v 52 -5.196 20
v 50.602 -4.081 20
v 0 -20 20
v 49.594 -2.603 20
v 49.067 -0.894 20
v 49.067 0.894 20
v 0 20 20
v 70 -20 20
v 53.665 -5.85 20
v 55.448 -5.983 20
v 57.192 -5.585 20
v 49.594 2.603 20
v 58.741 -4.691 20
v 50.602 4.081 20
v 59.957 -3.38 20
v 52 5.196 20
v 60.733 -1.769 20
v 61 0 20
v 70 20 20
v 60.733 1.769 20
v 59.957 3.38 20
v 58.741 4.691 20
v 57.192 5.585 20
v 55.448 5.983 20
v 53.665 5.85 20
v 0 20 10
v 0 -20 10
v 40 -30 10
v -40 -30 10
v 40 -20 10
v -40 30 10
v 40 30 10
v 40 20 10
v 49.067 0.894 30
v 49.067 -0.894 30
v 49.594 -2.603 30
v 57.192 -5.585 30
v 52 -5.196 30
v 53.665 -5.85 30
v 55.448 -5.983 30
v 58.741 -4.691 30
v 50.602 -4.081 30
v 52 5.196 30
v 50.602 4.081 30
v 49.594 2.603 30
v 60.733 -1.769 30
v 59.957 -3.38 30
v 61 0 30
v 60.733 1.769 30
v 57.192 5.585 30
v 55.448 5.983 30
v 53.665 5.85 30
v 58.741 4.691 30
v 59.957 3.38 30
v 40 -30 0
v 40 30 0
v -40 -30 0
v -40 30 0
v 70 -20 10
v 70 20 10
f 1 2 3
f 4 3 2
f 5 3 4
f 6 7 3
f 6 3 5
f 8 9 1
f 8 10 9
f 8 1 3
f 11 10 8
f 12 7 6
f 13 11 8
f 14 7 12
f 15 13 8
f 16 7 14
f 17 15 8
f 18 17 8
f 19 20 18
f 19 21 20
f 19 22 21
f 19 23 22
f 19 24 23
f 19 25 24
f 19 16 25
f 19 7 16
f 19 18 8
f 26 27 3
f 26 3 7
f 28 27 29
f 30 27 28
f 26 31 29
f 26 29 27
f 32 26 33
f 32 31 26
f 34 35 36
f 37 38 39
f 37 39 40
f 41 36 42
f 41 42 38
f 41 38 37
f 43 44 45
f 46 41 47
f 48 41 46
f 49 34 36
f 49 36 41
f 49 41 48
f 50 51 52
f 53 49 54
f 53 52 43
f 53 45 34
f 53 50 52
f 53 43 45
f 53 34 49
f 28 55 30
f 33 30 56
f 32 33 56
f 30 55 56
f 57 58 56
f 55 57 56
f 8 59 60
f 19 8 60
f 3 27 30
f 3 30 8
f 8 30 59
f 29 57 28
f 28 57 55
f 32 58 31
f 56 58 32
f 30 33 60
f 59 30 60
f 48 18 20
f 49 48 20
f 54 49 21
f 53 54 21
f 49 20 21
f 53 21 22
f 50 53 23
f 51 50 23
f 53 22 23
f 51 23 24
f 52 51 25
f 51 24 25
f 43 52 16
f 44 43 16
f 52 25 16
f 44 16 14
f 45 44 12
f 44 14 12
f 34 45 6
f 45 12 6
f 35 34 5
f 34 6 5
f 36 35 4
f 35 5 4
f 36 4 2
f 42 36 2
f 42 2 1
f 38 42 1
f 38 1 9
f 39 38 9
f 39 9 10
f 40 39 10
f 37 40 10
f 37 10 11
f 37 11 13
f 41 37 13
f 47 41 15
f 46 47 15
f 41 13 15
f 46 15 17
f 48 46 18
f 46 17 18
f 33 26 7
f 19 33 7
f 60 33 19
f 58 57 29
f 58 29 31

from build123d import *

# Parameters (mm, degrees)
CROQUIS1_W              = 80
CROQUIS1_H              = 60
SALIENTE_EXTRUIR1_DEPTH = 10
CROQUIS2_W              = 70
CROQUIS2_H              = 40
SALIENTE_EXTRUIR2_DEPTH = 10
CROQUIS3_R              = 6
SALIENTE_EXTRUIR3_DEPTH = 10


with BuildPart() as part:
    # Croquis1 → Saliente-Extruir1 (new body)
    with BuildSketch(Plane.XY):
        Rectangle(CROQUIS1_W, CROQUIS1_H)
    extrude(amount=SALIENTE_EXTRUIR1_DEPTH)

    # Croquis2 → Saliente-Extruir2 (add)
    with BuildSketch(Plane.XY.offset(10)):
        with Locations((35, 0)):
            Rectangle(CROQUIS2_W, CROQUIS2_H)
    extrude(amount=SALIENTE_EXTRUIR2_DEPTH)

    # Croquis3 → Saliente-Extruir3 (add)
    with BuildSketch(Plane.XY.offset(20)):
        with Locations((55, 0)):
            Circle(CROQUIS3_R)
    extrude(amount=SALIENTE_EXTRUIR3_DEPTH)


solid = part.part
